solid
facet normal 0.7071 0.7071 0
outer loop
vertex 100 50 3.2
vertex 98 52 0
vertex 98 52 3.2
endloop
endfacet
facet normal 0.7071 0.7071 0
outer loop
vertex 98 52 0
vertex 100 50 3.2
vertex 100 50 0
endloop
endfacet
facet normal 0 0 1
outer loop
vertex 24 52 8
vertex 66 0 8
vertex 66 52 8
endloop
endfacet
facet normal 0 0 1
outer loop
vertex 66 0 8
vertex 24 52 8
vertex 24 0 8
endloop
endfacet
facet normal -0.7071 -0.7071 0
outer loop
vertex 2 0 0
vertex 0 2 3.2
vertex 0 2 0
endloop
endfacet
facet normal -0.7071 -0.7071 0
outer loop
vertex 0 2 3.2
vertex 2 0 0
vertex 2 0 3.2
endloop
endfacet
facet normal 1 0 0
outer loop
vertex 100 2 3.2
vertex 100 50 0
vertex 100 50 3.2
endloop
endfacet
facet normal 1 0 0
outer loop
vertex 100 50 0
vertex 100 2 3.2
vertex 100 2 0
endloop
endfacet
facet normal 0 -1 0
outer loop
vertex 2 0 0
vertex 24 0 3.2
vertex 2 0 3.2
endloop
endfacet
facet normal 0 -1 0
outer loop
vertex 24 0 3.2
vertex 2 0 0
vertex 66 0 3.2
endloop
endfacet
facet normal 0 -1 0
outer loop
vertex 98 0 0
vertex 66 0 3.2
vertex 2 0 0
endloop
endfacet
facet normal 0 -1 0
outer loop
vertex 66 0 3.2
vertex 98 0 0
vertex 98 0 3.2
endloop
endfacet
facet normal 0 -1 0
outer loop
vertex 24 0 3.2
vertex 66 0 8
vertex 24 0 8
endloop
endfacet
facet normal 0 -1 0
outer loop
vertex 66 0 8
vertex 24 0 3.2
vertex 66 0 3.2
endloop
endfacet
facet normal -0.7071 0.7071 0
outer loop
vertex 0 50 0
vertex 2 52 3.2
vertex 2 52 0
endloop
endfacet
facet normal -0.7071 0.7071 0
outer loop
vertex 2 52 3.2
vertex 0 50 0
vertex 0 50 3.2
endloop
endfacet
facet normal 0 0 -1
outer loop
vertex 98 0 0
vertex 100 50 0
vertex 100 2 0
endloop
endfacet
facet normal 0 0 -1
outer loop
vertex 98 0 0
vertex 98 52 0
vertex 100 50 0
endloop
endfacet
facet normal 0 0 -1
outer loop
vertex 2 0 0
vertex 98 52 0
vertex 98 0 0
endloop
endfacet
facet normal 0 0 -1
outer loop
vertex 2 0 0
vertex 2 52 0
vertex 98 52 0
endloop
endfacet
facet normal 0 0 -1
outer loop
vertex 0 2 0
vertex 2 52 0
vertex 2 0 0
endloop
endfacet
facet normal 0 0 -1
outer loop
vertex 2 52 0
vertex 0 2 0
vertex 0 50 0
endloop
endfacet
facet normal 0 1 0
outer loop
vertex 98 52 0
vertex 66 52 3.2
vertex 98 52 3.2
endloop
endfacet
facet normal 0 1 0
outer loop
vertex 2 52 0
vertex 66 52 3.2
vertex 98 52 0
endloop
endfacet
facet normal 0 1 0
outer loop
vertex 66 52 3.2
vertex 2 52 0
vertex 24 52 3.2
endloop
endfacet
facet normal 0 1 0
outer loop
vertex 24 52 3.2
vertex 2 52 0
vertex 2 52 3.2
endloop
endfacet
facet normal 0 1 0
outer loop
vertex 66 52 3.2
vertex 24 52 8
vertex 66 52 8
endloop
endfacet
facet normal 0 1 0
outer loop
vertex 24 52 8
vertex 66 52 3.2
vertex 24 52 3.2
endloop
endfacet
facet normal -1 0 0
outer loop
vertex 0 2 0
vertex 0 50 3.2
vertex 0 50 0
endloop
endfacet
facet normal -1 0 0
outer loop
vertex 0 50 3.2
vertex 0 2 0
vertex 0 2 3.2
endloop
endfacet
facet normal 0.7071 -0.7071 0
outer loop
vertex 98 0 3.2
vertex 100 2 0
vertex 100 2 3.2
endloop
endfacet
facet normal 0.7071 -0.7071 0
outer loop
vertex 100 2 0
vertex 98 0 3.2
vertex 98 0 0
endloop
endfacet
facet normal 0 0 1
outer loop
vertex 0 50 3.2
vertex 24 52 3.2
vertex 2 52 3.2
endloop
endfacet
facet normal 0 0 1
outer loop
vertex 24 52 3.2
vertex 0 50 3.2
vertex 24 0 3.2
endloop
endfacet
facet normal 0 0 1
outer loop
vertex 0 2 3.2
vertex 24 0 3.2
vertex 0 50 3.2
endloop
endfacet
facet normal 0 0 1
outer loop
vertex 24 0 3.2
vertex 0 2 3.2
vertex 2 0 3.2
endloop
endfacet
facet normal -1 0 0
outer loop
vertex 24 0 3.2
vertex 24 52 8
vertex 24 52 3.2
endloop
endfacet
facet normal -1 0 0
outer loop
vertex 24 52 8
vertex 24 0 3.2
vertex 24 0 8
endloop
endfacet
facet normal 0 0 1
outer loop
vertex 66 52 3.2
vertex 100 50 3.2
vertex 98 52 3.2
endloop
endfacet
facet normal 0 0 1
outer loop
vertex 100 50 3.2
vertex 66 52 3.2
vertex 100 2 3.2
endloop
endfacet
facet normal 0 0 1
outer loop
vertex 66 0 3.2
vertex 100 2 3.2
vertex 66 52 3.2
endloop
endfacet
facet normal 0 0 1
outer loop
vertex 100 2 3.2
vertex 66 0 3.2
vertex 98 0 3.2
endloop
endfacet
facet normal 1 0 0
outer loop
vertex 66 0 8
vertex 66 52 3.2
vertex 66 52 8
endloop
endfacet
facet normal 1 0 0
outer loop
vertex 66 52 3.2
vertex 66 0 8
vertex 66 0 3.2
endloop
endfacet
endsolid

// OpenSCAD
$fn = 32;

// ----------------------------------------------------------------------
// Stepped bar: centerstep, 100 x 52 x 8/3.2 mm
// ----------------------------------------------------------------------

// --- parameters (mm) ---
bar_l = 100;              // bar length, X
bar_w = 52;               // bar width, Y
plate_t = 8;              // thickness of the thick zone, Z
thin_t = 3.2;             // thickness of the thin zone
corner_c = 2;             // corner chamfer of the bar
step_cut = 4.8;           // material removed from the thin zone
thick_from = 24;          // start of the thick middle zone
thick_to = 66;            // end of the thick middle zone
depth_1 = 4.8;            // depth of cut 1 from the top face
depth_2 = 4.8;            // depth of cut 2 from the top face

profile = [[2, 0], [98, 0], [100, 2], [100, 50], [98, 52], [2, 52], [0, 50], [0, 2]];  // primary outline, 8 points, counter clockwise
void_1 = [[-1, -1], [24, -1], [24, 53], [-1, 53]];  // thin left end, 4 points
void_2 = [[66, -1], [101, -1], [101, 53], [66, 53]];  // thin right end, 4 points

// --- the one profile operation ---
difference() {
  linear_extrude(height = plate_t) polygon(points = profile);
  translate([0, 0, plate_t - depth_1])
    linear_extrude(height = depth_1 + 1) polygon(points = void_1);
  translate([0, 0, plate_t - depth_2])
    linear_extrude(height = depth_2 + 1) polygon(points = void_2);
}
